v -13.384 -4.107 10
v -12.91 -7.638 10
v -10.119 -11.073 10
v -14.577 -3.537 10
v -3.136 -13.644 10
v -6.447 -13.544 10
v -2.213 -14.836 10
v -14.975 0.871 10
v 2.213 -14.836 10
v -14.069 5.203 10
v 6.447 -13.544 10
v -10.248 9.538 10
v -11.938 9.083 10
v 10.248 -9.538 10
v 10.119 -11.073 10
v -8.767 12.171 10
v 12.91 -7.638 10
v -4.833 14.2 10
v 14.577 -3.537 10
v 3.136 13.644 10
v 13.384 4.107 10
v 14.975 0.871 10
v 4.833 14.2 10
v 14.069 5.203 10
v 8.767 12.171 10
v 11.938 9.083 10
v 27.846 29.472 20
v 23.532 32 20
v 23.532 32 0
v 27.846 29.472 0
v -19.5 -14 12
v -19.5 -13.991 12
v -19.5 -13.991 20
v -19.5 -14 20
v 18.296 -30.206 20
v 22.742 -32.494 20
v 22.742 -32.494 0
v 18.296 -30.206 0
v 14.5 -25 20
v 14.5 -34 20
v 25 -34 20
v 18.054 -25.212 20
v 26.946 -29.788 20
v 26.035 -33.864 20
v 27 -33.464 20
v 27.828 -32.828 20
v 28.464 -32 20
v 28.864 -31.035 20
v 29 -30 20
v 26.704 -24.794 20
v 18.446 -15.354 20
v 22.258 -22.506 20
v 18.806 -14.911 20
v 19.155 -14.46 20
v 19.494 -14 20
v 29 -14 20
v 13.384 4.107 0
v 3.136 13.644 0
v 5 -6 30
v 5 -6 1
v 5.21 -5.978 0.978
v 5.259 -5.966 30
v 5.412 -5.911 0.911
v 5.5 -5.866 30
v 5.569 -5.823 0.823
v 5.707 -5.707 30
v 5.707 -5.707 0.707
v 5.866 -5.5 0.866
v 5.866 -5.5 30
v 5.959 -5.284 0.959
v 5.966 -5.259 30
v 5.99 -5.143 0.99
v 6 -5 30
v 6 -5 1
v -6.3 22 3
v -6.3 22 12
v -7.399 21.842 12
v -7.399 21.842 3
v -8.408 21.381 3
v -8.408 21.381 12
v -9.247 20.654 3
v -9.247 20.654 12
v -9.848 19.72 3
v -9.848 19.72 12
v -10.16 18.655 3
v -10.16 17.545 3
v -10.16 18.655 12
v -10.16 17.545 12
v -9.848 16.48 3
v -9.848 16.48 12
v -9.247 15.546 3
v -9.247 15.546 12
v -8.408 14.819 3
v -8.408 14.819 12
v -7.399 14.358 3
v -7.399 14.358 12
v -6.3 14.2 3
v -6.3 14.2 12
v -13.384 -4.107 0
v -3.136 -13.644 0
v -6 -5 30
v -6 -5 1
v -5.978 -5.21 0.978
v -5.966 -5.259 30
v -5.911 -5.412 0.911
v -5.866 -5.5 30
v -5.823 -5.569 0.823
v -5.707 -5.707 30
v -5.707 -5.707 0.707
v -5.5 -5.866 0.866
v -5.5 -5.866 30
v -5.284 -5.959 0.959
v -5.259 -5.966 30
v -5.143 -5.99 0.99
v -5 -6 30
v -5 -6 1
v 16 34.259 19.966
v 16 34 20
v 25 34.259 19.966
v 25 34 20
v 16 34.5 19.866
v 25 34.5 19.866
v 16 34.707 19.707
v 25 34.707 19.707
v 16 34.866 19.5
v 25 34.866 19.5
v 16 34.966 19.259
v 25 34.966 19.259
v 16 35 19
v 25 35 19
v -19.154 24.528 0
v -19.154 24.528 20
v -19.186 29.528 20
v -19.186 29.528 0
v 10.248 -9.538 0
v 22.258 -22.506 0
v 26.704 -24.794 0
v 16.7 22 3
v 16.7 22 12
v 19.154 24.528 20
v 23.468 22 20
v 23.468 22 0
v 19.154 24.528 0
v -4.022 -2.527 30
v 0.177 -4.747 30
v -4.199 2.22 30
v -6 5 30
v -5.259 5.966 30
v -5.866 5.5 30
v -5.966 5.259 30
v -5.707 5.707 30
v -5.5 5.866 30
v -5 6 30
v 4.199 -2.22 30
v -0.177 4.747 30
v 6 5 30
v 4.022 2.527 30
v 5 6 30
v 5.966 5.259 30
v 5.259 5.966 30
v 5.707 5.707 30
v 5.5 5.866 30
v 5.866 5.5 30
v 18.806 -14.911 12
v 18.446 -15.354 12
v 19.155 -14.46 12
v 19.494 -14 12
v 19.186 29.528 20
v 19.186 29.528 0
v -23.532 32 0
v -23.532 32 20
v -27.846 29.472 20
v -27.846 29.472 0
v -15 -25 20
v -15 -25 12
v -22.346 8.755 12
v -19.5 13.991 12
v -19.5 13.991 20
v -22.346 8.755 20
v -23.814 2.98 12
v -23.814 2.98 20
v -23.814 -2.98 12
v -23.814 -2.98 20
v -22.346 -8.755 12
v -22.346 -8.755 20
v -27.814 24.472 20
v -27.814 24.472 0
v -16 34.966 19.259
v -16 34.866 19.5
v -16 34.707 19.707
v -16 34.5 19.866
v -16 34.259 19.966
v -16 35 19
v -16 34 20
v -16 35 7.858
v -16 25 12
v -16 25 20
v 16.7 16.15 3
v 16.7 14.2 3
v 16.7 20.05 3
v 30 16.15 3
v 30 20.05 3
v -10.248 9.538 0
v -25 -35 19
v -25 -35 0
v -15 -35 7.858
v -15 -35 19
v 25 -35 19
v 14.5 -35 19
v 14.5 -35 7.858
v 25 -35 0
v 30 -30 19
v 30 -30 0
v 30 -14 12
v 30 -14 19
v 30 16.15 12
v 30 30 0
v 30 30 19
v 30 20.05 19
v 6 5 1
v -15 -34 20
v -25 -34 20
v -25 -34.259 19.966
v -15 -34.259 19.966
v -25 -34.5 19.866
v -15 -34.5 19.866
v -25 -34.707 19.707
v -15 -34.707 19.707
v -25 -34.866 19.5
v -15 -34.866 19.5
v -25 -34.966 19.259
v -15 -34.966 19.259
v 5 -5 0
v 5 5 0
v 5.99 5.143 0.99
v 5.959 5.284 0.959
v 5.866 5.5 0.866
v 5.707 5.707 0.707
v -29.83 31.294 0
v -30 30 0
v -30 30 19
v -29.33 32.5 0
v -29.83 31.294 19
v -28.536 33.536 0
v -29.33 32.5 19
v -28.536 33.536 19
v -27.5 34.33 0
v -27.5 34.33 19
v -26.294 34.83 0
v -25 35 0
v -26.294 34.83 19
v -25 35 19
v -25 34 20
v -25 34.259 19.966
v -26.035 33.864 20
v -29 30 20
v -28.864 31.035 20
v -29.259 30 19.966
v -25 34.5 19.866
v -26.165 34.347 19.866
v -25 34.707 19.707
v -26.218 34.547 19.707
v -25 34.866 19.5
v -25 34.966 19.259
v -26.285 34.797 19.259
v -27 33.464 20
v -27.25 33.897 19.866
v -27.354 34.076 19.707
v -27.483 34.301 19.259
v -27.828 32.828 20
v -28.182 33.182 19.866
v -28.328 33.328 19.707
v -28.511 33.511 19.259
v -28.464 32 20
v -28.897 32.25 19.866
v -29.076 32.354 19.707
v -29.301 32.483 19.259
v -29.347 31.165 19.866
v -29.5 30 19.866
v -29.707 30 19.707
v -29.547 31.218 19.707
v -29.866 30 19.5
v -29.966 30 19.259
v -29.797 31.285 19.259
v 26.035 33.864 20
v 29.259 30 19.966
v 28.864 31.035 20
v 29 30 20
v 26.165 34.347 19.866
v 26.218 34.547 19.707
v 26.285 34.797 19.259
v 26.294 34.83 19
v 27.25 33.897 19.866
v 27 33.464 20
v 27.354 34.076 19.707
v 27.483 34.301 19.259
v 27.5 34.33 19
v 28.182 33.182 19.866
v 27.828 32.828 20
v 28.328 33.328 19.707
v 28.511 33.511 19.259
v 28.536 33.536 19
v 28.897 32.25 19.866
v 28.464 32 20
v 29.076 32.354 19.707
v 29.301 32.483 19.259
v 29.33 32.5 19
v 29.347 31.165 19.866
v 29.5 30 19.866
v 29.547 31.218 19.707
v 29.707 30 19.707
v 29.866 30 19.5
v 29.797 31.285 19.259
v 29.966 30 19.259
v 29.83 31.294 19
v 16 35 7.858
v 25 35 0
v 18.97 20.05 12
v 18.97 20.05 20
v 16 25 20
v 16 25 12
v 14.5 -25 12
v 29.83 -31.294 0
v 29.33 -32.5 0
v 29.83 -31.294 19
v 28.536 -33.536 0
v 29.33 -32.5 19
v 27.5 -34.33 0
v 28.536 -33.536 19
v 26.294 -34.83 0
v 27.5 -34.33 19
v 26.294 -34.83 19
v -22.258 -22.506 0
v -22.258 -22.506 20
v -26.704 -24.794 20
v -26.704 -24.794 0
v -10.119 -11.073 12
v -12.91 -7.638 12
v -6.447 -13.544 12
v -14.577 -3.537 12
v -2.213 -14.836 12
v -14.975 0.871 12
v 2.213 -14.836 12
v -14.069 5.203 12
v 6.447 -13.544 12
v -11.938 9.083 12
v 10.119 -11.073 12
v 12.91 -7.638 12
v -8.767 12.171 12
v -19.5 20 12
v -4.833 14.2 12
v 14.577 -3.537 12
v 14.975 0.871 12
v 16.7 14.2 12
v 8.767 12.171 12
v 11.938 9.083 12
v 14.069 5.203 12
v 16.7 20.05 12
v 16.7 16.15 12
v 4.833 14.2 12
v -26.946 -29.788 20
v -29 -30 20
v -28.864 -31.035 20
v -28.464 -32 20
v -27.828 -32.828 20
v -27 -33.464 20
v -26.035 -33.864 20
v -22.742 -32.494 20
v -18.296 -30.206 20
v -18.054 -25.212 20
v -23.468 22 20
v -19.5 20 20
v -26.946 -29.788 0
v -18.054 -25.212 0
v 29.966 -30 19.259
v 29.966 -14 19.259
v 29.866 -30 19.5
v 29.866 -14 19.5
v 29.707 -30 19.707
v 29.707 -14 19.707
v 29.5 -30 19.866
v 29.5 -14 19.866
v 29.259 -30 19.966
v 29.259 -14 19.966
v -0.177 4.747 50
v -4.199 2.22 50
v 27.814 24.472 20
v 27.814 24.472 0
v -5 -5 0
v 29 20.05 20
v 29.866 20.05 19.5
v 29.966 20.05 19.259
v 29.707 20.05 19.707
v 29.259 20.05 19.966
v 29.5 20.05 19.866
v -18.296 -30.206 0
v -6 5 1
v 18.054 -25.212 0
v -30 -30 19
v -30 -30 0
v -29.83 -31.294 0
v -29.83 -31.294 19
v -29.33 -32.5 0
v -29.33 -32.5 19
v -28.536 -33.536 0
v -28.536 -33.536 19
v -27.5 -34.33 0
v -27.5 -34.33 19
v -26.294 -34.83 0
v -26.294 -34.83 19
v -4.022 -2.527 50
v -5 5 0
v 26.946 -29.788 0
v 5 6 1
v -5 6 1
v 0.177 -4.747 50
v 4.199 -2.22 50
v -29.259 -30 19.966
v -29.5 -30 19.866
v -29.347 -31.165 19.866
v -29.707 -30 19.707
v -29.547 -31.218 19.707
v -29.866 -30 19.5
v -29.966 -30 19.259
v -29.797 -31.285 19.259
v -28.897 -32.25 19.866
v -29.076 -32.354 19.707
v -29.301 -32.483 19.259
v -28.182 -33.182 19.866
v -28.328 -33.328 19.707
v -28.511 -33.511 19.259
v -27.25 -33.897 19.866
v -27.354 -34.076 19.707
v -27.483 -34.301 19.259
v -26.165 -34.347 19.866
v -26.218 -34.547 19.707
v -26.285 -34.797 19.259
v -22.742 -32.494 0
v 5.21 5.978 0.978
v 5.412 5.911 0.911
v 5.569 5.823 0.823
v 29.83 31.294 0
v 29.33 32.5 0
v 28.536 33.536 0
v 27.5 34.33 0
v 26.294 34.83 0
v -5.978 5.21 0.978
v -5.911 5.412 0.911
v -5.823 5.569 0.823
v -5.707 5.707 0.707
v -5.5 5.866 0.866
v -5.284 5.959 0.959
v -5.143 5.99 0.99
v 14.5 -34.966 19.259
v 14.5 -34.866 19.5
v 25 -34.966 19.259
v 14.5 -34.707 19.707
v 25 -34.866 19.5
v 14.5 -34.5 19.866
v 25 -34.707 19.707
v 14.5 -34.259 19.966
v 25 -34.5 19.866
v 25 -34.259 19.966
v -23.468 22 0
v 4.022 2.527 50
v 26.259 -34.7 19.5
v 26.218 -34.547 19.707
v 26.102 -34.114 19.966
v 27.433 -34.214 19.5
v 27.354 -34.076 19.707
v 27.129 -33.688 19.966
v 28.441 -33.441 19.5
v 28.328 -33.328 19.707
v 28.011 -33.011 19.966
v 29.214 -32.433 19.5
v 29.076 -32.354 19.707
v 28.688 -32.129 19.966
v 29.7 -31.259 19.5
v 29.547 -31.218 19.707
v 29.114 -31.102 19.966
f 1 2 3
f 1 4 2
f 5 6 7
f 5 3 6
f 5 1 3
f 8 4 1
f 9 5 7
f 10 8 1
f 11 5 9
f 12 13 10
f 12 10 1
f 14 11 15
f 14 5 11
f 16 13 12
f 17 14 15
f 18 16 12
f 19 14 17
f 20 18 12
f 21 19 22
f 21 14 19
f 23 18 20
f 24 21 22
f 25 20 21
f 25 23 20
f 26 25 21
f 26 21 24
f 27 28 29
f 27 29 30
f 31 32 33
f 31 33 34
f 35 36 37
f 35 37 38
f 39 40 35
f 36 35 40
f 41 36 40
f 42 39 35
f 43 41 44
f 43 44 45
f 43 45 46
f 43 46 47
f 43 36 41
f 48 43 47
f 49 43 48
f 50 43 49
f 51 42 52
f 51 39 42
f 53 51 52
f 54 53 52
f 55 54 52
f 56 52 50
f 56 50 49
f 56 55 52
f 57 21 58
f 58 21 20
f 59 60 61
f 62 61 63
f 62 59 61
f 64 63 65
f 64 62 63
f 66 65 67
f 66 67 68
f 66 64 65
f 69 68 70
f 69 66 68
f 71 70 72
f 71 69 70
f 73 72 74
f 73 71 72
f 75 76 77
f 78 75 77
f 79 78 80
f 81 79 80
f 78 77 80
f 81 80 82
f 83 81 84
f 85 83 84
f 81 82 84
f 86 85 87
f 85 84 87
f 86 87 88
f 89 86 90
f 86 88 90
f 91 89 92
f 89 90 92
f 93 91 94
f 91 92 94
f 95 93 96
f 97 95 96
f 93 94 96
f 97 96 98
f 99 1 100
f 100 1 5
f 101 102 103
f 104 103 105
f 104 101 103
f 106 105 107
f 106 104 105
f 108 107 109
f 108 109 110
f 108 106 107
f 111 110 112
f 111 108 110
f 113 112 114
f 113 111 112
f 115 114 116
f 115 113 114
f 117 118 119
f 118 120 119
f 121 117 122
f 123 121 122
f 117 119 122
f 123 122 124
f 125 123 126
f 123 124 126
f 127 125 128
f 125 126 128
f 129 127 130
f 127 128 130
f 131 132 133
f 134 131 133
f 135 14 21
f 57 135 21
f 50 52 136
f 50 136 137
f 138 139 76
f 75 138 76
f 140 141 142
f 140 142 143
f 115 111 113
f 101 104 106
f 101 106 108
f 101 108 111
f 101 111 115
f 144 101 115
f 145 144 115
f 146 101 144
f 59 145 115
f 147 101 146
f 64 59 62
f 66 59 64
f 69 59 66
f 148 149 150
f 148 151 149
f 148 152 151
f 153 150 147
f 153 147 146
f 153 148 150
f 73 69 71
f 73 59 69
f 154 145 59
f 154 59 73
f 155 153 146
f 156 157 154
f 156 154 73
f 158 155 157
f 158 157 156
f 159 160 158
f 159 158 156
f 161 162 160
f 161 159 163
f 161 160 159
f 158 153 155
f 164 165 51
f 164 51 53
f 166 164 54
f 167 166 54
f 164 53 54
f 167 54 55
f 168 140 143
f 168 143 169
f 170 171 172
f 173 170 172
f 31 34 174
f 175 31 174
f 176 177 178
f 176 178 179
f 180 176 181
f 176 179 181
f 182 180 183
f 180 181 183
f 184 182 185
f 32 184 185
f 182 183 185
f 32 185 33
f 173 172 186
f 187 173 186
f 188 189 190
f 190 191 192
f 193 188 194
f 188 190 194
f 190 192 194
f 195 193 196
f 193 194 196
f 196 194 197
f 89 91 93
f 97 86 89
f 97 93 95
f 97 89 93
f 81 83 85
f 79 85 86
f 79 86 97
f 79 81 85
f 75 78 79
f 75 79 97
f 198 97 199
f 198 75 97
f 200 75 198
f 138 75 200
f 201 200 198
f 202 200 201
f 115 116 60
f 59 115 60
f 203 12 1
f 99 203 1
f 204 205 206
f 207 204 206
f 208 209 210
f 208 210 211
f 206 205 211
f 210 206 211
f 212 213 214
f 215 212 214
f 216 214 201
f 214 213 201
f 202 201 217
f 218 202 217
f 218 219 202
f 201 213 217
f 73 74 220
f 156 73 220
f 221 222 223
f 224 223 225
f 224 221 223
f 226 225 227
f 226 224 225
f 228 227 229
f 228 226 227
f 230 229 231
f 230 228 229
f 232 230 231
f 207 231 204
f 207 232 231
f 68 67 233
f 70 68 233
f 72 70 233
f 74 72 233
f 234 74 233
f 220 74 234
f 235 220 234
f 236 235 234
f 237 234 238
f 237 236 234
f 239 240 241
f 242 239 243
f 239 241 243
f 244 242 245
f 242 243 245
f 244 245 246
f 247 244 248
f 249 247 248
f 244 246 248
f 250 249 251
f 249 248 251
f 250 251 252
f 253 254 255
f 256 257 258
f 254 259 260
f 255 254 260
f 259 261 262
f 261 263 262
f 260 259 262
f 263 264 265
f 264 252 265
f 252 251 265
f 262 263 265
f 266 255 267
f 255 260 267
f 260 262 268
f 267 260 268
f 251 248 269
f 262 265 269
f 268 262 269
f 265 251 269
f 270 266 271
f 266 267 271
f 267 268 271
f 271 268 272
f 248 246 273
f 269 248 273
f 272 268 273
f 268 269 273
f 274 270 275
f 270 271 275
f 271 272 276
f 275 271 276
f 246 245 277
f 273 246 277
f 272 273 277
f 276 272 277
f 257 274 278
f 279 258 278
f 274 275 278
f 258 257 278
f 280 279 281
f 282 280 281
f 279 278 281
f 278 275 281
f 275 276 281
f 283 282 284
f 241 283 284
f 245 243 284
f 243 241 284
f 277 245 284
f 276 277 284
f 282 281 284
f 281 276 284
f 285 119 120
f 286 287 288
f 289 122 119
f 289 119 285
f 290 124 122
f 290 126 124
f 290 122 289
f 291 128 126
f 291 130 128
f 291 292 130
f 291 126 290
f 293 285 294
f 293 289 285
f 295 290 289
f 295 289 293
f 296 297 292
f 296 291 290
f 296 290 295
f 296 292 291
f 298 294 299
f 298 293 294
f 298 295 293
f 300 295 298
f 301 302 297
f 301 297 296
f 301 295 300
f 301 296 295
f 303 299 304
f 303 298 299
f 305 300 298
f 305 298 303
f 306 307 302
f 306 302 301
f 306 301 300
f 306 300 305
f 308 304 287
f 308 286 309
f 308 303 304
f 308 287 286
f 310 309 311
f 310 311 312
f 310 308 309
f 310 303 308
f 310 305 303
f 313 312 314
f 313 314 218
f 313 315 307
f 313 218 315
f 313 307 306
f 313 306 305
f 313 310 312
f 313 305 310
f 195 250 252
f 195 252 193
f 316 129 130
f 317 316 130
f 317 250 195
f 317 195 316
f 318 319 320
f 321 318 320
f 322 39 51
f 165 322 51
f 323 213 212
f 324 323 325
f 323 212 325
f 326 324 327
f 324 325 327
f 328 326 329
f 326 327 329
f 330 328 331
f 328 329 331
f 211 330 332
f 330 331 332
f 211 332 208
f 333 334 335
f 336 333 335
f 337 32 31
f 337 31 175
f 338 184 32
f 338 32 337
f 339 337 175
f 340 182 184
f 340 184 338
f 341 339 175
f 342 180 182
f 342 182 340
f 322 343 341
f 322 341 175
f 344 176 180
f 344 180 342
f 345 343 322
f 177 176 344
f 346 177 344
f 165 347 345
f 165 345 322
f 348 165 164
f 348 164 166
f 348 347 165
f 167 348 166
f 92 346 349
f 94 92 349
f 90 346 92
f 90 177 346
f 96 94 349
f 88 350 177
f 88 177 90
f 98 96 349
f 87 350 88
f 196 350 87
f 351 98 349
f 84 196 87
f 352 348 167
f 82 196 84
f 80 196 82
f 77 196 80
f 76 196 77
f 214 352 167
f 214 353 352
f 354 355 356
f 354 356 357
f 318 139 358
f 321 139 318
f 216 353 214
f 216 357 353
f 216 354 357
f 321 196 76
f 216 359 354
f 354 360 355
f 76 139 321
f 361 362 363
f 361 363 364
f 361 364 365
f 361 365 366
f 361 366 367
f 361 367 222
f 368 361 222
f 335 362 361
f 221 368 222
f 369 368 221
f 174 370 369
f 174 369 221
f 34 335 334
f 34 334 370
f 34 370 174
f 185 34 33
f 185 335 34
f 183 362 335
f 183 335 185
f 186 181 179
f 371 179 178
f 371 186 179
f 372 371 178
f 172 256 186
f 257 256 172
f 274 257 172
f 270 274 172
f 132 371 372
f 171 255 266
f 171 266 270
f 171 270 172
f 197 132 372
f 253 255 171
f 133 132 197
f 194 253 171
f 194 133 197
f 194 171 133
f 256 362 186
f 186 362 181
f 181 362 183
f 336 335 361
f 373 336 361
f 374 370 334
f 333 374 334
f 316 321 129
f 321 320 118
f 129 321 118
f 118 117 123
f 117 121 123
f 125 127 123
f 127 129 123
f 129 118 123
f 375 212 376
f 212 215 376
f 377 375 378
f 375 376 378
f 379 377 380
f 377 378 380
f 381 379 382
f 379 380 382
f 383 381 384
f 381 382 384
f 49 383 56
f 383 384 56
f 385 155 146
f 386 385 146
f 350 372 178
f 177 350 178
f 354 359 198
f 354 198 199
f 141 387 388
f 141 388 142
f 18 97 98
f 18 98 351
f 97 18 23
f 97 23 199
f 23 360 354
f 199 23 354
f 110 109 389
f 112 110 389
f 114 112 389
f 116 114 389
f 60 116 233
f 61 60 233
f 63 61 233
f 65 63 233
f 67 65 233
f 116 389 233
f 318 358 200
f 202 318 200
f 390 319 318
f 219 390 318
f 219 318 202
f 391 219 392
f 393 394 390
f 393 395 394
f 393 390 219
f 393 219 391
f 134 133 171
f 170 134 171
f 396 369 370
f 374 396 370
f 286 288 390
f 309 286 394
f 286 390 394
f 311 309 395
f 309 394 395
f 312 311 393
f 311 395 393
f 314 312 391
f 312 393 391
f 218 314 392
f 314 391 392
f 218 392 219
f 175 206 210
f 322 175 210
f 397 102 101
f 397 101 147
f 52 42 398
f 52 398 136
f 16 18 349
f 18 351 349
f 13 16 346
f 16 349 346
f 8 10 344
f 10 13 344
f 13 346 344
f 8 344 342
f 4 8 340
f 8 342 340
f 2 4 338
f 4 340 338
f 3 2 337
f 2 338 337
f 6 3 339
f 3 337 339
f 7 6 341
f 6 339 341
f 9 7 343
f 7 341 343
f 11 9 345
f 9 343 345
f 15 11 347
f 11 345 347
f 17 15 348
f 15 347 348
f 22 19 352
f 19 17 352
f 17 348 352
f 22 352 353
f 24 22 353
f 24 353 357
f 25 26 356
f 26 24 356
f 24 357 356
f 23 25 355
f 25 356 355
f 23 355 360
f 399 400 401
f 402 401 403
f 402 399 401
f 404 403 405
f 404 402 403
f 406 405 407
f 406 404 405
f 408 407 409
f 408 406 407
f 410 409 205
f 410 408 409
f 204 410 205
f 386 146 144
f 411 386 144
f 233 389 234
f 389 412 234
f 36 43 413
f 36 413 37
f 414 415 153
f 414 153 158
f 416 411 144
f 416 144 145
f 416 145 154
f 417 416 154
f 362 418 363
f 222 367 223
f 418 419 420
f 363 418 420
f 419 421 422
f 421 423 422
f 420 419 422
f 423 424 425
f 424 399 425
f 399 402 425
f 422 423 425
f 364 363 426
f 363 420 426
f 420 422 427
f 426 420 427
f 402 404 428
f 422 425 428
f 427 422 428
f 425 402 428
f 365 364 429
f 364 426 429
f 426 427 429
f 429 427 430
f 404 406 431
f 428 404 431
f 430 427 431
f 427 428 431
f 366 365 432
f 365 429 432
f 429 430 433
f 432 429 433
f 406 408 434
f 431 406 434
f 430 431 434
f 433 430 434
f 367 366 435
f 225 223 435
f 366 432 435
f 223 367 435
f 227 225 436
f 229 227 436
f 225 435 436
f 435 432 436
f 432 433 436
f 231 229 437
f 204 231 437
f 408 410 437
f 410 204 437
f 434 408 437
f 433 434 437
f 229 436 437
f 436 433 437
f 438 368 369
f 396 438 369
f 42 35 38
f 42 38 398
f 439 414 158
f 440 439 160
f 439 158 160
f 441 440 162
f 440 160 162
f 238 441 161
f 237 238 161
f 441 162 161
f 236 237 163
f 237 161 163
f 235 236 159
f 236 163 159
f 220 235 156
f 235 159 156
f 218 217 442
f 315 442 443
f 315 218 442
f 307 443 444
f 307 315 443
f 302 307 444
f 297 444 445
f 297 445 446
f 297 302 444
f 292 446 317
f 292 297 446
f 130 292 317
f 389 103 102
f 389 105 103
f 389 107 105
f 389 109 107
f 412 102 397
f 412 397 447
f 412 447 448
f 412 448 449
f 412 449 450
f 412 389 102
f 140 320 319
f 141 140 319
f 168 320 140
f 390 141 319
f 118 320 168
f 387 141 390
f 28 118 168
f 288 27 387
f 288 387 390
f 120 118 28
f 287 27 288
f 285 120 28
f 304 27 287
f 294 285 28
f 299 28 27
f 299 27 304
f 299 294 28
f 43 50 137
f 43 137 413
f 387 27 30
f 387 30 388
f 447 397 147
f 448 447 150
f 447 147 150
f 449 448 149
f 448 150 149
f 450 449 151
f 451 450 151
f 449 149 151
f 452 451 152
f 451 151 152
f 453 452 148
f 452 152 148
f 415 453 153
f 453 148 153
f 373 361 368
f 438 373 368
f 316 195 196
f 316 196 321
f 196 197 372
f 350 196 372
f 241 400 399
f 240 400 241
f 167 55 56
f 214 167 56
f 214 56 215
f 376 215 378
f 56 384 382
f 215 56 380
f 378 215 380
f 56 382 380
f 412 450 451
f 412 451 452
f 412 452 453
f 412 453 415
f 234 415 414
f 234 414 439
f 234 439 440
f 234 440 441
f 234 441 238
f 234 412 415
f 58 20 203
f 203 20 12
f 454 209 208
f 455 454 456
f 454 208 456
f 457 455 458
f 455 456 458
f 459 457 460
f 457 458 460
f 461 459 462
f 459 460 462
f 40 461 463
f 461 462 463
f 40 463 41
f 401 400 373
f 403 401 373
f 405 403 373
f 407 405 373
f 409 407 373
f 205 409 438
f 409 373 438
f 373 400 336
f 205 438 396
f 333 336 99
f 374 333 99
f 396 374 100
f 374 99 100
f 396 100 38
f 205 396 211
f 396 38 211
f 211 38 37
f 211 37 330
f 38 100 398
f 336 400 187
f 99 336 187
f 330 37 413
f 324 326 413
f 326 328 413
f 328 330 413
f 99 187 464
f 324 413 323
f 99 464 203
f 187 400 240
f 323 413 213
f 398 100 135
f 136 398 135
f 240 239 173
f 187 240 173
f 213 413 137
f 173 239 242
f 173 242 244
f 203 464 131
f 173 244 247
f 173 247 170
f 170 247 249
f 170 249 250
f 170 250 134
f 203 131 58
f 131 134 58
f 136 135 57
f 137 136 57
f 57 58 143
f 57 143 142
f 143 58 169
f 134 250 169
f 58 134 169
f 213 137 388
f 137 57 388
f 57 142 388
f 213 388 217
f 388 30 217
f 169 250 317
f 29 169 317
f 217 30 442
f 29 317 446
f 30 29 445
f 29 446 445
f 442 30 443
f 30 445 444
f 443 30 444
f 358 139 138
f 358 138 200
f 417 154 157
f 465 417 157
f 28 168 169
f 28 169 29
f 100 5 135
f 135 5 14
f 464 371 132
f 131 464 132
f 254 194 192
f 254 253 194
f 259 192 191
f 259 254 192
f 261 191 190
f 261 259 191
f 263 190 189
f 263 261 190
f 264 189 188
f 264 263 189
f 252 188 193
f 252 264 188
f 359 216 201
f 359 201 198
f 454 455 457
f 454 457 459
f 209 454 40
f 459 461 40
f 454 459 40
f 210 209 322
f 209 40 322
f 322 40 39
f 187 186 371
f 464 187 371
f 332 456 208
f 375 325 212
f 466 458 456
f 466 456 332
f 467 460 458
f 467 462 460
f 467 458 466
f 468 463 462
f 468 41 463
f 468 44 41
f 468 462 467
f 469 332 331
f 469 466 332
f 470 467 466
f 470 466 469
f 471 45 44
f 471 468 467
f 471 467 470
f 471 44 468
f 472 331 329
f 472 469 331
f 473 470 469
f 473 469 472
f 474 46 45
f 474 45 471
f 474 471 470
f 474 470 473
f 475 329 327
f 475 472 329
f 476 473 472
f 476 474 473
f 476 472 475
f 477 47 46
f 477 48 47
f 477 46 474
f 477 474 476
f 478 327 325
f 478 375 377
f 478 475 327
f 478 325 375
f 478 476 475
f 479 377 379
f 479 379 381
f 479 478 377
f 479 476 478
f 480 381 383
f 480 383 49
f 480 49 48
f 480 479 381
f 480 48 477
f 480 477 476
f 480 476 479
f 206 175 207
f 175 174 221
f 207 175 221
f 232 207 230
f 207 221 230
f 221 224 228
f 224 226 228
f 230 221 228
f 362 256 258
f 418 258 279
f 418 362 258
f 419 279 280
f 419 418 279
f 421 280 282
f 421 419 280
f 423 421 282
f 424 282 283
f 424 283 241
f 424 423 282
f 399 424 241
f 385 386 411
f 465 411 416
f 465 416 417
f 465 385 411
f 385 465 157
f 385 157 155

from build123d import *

# Parameters (mm, degrees)
SKETCH_W        = 60
SKETCH_H        = 70
PAD_DEPTH       = 20
SKETCH001_R     = 15
POCKET_DEPTH    = 10
SKETCH003_R     = 24
POCKET002_DEPTH = 8
POCKET003_DEPTH = 8
POCKET004_DEPTH = 17
FILLET_R        = 5
POCKET005_DEPTH = 20
POCKET006_DEPTH = 20
POCKET007_DEPTH = 20
POCKET008_DEPTH = 20
CHAMFER_1_ANGLE = 22.5
CHAMFER_1_SIZE  = 10
CHAMFER_2_ANGLE = 22.5
CHAMFER_2_SIZE  = 10
FILLET003_R     = 1
PAD001_DEPTH    = 50
SKETCH010_W     = 12
SKETCH010_H     = 12
PAD002_DEPTH    = 30
CHAMFER002_SIZE = 1
FILLET002_R     = 1


with BuildPart() as body:
    # Sketch → Pad (new body)
    with BuildSketch(Plane.XY):
        Rectangle(SKETCH_W, SKETCH_H)
    extrude(amount=PAD_DEPTH)

    # Sketch001 (on DatumPlane) → Pocket (cut)
    with BuildSketch(Plane.XY.offset(20)):
        Circle(SKETCH001_R)
    extrude(amount=-POCKET_DEPTH, mode=Mode.SUBTRACT)

    # Sketch003 (on DatumPlane) → Pocket002 (cut)
    with BuildSketch(Plane.XY.offset(20)):
        Circle(SKETCH003_R)
    extrude(amount=-POCKET002_DEPTH, mode=Mode.SUBTRACT)

    # Sketch007 (on DatumPlane) → Pocket003 (cut)
    with BuildSketch(Plane.XY.offset(20)):
        Polygon((19, 20), (16, 25), (16, 35.409691), (-16, 35.409691), (-16, 25), (-19.5, 20), (-19.5, -14), (-15, -25), (-15, -35.028248), (14.5, -35.028248), (14.5, -25), (19, -14), (30.000004, -14), (30.000004, 20), align=None)
    extrude(amount=-POCKET003_DEPTH, mode=Mode.SUBTRACT)

    # Sketch005 (on DatumPlane) → Pocket004 (cut)
    with BuildSketch(Plane.XY.offset(20)):
        with BuildLine():
            Line((16.7, 22), (-6.3, 22))
            ThreePointArc((-6.3, 22), (-10.2, 18.1), (-6.3, 14.2))
            Line((-6.3, 14.2), (16.7, 14.2))
            Line((16.7, 16.15), (16.7, 14.2))
            Line((30, 16.15), (16.7, 16.15))
            Line((30, 20.05), (30, 16.15))
            Line((16.7, 20.05), (30, 20.05))
            Line((16.7, 22), (16.7, 20.05))
        make_face()
    extrude(amount=-POCKET004_DEPTH, mode=Mode.SUBTRACT)

    # Fillet
    fillet_edges = [body.edges().sort_by_distance(p)[0] for p in [
        (-30, 35, 10),
        (30, 35, 10),
        (-30, -35, 10),
        (30, -35, 10),
    ]]
    fillet(fillet_edges, radius=FILLET_R)

    # Sketch012 (on DatumPlane) → Pocket005 (cut)
    with BuildSketch(Plane.XY.offset(20)):
        Polygon((-18.295802, -30.206422), (-18.054071, -25.212269), (-22.258268, -22.505847), (-26.704198, -24.793578), (-26.945929, -29.787731), (-22.741732, -32.494153), align=None)
    extrude(amount=-POCKET005_DEPTH, mode=Mode.SUBTRACT)

    # Sketch009 (on DatumPlane) → Pocket006 (cut)
    with BuildSketch(Plane.XY.offset(20)):
        Polygon((10.248433, -9.5378), (13.384193, 4.106503), (3.135761, 13.644303), (-10.248433, 9.5378), (-13.384193, -4.106503), (-3.135761, -13.644303), align=None)
    extrude(amount=-POCKET006_DEPTH, mode=Mode.SUBTRACT)

    # Sketch012 (on DatumPlane) → Pocket007 (cut)
    with BuildSketch(Plane.XY.offset(20)):
        Polygon((-18.295802, -30.206422), (-18.054071, -25.212269), (-22.258268, -22.505847), (-26.704198, -24.793578), (-26.945929, -29.787731), (-22.741732, -32.494153), align=None)
    pocket007 = extrude(amount=-POCKET007_DEPTH, mode=Mode.SUBTRACT)

    # Sketch008 (on DatumPlane) → Pocket008 (cut)
    with BuildSketch(Plane.XY.offset(20)):
        Polygon((-19.186076, 29.527857), (-23.532227, 31.999896), (-27.846151, 29.472039), (-27.813924, 24.472143), (-23.467773, 22.000104), (-19.153849, 24.527961), align=None)
    pocket008 = extrude(amount=-POCKET008_DEPTH, mode=Mode.SUBTRACT)

    # Mirrored: Pocket008 across Sketch008 V_Axis
    add(pocket008.mirror(Plane(origin=(0, 0, 20), x_dir=(0, 0, 1), z_dir=(1, 0, 0))), mode=Mode.SUBTRACT)

    # Mirrored001: Pocket007 across Sketch012 V_Axis
    add(pocket007.mirror(Plane(origin=(0, 0, 20), x_dir=(0, 0, 1), z_dir=(1, 0, 0))), mode=Mode.SUBTRACT)

    # Chamfer 1
    chamfer_1_edges = [body.edges().sort_by_distance(p)[0] for p in [
        (-0.25, -35, 12),
    ]]
    chamfer_1_side = body.faces().sort_by_distance((-0.405265, -28.061793, 12))[0]
    chamfer(chamfer_1_edges, length=CHAMFER_1_SIZE, angle=CHAMFER_1_ANGLE, reference=chamfer_1_side)

    # Chamfer 2
    chamfer_2_edges = [body.edges().sort_by_distance(p)[0] for p in [
        (0, 35, 12),
    ]]
    chamfer_2_side = body.faces().sort_by_distance((-1.063784, 28.061193, 12))[0]
    chamfer(chamfer_2_edges, length=CHAMFER_2_SIZE, angle=CHAMFER_2_ANGLE, reference=chamfer_2_side)

    # Fillet003
    fillet003_edges = [body.edges().sort_by_distance(p)[0] for p in [
        (-20, -35, 20),
        (-28.535534, -33.535534, 20),
        (-30, 0, 20),
        (-28.535534, 33.535534, 20),
        (-20.5, 35, 20),
        (20.5, 35, 20),
        (28.535534, 33.535534, 20),
        (30, 25.025, 20),
        (30, -22, 20),
        (28.535534, -33.535534, 20),
        (19.75, -35, 20),
    ]]
    fillet(fillet003_edges, radius=FILLET003_R)


with BuildPart() as body001:
    # Sketch011 → Pad001 (new body)
    with BuildSketch(Plane.XY):
        Polygon((4.199412, -2.219784), (4.022095, 2.526905), (-0.177317, 4.746689), (-4.199412, 2.219784), (-4.022095, -2.526905), (0.177317, -4.746689), align=None)
    extrude(amount=PAD001_DEPTH)

    # Sketch010 → Pad002 (join)
    with BuildSketch(Plane.XY):
        Rectangle(SKETCH010_W, SKETCH010_H)
    extrude(amount=PAD002_DEPTH)

    # Chamfer002
    chamfer002_edges = [body001.edges().sort_by_distance(p)[0] for p in [
        (0, -6, 0),
        (6, 0, 0),
        (0, 6, 0),
        (-6, 0, 0),
    ]]
    chamfer(chamfer002_edges, length=CHAMFER002_SIZE)

    # Fillet002
    fillet002_edges = [body001.edges().sort_by_distance(p)[0] for p in [
        (6, -6, 15.5),
        (-6, -6, 15.5),
        (6, 6, 15.5),
        (-6, 6, 15.5),
    ]]
    fillet(fillet002_edges, radius=FILLET002_R)


solid = Compound([body.part, body001.part])
